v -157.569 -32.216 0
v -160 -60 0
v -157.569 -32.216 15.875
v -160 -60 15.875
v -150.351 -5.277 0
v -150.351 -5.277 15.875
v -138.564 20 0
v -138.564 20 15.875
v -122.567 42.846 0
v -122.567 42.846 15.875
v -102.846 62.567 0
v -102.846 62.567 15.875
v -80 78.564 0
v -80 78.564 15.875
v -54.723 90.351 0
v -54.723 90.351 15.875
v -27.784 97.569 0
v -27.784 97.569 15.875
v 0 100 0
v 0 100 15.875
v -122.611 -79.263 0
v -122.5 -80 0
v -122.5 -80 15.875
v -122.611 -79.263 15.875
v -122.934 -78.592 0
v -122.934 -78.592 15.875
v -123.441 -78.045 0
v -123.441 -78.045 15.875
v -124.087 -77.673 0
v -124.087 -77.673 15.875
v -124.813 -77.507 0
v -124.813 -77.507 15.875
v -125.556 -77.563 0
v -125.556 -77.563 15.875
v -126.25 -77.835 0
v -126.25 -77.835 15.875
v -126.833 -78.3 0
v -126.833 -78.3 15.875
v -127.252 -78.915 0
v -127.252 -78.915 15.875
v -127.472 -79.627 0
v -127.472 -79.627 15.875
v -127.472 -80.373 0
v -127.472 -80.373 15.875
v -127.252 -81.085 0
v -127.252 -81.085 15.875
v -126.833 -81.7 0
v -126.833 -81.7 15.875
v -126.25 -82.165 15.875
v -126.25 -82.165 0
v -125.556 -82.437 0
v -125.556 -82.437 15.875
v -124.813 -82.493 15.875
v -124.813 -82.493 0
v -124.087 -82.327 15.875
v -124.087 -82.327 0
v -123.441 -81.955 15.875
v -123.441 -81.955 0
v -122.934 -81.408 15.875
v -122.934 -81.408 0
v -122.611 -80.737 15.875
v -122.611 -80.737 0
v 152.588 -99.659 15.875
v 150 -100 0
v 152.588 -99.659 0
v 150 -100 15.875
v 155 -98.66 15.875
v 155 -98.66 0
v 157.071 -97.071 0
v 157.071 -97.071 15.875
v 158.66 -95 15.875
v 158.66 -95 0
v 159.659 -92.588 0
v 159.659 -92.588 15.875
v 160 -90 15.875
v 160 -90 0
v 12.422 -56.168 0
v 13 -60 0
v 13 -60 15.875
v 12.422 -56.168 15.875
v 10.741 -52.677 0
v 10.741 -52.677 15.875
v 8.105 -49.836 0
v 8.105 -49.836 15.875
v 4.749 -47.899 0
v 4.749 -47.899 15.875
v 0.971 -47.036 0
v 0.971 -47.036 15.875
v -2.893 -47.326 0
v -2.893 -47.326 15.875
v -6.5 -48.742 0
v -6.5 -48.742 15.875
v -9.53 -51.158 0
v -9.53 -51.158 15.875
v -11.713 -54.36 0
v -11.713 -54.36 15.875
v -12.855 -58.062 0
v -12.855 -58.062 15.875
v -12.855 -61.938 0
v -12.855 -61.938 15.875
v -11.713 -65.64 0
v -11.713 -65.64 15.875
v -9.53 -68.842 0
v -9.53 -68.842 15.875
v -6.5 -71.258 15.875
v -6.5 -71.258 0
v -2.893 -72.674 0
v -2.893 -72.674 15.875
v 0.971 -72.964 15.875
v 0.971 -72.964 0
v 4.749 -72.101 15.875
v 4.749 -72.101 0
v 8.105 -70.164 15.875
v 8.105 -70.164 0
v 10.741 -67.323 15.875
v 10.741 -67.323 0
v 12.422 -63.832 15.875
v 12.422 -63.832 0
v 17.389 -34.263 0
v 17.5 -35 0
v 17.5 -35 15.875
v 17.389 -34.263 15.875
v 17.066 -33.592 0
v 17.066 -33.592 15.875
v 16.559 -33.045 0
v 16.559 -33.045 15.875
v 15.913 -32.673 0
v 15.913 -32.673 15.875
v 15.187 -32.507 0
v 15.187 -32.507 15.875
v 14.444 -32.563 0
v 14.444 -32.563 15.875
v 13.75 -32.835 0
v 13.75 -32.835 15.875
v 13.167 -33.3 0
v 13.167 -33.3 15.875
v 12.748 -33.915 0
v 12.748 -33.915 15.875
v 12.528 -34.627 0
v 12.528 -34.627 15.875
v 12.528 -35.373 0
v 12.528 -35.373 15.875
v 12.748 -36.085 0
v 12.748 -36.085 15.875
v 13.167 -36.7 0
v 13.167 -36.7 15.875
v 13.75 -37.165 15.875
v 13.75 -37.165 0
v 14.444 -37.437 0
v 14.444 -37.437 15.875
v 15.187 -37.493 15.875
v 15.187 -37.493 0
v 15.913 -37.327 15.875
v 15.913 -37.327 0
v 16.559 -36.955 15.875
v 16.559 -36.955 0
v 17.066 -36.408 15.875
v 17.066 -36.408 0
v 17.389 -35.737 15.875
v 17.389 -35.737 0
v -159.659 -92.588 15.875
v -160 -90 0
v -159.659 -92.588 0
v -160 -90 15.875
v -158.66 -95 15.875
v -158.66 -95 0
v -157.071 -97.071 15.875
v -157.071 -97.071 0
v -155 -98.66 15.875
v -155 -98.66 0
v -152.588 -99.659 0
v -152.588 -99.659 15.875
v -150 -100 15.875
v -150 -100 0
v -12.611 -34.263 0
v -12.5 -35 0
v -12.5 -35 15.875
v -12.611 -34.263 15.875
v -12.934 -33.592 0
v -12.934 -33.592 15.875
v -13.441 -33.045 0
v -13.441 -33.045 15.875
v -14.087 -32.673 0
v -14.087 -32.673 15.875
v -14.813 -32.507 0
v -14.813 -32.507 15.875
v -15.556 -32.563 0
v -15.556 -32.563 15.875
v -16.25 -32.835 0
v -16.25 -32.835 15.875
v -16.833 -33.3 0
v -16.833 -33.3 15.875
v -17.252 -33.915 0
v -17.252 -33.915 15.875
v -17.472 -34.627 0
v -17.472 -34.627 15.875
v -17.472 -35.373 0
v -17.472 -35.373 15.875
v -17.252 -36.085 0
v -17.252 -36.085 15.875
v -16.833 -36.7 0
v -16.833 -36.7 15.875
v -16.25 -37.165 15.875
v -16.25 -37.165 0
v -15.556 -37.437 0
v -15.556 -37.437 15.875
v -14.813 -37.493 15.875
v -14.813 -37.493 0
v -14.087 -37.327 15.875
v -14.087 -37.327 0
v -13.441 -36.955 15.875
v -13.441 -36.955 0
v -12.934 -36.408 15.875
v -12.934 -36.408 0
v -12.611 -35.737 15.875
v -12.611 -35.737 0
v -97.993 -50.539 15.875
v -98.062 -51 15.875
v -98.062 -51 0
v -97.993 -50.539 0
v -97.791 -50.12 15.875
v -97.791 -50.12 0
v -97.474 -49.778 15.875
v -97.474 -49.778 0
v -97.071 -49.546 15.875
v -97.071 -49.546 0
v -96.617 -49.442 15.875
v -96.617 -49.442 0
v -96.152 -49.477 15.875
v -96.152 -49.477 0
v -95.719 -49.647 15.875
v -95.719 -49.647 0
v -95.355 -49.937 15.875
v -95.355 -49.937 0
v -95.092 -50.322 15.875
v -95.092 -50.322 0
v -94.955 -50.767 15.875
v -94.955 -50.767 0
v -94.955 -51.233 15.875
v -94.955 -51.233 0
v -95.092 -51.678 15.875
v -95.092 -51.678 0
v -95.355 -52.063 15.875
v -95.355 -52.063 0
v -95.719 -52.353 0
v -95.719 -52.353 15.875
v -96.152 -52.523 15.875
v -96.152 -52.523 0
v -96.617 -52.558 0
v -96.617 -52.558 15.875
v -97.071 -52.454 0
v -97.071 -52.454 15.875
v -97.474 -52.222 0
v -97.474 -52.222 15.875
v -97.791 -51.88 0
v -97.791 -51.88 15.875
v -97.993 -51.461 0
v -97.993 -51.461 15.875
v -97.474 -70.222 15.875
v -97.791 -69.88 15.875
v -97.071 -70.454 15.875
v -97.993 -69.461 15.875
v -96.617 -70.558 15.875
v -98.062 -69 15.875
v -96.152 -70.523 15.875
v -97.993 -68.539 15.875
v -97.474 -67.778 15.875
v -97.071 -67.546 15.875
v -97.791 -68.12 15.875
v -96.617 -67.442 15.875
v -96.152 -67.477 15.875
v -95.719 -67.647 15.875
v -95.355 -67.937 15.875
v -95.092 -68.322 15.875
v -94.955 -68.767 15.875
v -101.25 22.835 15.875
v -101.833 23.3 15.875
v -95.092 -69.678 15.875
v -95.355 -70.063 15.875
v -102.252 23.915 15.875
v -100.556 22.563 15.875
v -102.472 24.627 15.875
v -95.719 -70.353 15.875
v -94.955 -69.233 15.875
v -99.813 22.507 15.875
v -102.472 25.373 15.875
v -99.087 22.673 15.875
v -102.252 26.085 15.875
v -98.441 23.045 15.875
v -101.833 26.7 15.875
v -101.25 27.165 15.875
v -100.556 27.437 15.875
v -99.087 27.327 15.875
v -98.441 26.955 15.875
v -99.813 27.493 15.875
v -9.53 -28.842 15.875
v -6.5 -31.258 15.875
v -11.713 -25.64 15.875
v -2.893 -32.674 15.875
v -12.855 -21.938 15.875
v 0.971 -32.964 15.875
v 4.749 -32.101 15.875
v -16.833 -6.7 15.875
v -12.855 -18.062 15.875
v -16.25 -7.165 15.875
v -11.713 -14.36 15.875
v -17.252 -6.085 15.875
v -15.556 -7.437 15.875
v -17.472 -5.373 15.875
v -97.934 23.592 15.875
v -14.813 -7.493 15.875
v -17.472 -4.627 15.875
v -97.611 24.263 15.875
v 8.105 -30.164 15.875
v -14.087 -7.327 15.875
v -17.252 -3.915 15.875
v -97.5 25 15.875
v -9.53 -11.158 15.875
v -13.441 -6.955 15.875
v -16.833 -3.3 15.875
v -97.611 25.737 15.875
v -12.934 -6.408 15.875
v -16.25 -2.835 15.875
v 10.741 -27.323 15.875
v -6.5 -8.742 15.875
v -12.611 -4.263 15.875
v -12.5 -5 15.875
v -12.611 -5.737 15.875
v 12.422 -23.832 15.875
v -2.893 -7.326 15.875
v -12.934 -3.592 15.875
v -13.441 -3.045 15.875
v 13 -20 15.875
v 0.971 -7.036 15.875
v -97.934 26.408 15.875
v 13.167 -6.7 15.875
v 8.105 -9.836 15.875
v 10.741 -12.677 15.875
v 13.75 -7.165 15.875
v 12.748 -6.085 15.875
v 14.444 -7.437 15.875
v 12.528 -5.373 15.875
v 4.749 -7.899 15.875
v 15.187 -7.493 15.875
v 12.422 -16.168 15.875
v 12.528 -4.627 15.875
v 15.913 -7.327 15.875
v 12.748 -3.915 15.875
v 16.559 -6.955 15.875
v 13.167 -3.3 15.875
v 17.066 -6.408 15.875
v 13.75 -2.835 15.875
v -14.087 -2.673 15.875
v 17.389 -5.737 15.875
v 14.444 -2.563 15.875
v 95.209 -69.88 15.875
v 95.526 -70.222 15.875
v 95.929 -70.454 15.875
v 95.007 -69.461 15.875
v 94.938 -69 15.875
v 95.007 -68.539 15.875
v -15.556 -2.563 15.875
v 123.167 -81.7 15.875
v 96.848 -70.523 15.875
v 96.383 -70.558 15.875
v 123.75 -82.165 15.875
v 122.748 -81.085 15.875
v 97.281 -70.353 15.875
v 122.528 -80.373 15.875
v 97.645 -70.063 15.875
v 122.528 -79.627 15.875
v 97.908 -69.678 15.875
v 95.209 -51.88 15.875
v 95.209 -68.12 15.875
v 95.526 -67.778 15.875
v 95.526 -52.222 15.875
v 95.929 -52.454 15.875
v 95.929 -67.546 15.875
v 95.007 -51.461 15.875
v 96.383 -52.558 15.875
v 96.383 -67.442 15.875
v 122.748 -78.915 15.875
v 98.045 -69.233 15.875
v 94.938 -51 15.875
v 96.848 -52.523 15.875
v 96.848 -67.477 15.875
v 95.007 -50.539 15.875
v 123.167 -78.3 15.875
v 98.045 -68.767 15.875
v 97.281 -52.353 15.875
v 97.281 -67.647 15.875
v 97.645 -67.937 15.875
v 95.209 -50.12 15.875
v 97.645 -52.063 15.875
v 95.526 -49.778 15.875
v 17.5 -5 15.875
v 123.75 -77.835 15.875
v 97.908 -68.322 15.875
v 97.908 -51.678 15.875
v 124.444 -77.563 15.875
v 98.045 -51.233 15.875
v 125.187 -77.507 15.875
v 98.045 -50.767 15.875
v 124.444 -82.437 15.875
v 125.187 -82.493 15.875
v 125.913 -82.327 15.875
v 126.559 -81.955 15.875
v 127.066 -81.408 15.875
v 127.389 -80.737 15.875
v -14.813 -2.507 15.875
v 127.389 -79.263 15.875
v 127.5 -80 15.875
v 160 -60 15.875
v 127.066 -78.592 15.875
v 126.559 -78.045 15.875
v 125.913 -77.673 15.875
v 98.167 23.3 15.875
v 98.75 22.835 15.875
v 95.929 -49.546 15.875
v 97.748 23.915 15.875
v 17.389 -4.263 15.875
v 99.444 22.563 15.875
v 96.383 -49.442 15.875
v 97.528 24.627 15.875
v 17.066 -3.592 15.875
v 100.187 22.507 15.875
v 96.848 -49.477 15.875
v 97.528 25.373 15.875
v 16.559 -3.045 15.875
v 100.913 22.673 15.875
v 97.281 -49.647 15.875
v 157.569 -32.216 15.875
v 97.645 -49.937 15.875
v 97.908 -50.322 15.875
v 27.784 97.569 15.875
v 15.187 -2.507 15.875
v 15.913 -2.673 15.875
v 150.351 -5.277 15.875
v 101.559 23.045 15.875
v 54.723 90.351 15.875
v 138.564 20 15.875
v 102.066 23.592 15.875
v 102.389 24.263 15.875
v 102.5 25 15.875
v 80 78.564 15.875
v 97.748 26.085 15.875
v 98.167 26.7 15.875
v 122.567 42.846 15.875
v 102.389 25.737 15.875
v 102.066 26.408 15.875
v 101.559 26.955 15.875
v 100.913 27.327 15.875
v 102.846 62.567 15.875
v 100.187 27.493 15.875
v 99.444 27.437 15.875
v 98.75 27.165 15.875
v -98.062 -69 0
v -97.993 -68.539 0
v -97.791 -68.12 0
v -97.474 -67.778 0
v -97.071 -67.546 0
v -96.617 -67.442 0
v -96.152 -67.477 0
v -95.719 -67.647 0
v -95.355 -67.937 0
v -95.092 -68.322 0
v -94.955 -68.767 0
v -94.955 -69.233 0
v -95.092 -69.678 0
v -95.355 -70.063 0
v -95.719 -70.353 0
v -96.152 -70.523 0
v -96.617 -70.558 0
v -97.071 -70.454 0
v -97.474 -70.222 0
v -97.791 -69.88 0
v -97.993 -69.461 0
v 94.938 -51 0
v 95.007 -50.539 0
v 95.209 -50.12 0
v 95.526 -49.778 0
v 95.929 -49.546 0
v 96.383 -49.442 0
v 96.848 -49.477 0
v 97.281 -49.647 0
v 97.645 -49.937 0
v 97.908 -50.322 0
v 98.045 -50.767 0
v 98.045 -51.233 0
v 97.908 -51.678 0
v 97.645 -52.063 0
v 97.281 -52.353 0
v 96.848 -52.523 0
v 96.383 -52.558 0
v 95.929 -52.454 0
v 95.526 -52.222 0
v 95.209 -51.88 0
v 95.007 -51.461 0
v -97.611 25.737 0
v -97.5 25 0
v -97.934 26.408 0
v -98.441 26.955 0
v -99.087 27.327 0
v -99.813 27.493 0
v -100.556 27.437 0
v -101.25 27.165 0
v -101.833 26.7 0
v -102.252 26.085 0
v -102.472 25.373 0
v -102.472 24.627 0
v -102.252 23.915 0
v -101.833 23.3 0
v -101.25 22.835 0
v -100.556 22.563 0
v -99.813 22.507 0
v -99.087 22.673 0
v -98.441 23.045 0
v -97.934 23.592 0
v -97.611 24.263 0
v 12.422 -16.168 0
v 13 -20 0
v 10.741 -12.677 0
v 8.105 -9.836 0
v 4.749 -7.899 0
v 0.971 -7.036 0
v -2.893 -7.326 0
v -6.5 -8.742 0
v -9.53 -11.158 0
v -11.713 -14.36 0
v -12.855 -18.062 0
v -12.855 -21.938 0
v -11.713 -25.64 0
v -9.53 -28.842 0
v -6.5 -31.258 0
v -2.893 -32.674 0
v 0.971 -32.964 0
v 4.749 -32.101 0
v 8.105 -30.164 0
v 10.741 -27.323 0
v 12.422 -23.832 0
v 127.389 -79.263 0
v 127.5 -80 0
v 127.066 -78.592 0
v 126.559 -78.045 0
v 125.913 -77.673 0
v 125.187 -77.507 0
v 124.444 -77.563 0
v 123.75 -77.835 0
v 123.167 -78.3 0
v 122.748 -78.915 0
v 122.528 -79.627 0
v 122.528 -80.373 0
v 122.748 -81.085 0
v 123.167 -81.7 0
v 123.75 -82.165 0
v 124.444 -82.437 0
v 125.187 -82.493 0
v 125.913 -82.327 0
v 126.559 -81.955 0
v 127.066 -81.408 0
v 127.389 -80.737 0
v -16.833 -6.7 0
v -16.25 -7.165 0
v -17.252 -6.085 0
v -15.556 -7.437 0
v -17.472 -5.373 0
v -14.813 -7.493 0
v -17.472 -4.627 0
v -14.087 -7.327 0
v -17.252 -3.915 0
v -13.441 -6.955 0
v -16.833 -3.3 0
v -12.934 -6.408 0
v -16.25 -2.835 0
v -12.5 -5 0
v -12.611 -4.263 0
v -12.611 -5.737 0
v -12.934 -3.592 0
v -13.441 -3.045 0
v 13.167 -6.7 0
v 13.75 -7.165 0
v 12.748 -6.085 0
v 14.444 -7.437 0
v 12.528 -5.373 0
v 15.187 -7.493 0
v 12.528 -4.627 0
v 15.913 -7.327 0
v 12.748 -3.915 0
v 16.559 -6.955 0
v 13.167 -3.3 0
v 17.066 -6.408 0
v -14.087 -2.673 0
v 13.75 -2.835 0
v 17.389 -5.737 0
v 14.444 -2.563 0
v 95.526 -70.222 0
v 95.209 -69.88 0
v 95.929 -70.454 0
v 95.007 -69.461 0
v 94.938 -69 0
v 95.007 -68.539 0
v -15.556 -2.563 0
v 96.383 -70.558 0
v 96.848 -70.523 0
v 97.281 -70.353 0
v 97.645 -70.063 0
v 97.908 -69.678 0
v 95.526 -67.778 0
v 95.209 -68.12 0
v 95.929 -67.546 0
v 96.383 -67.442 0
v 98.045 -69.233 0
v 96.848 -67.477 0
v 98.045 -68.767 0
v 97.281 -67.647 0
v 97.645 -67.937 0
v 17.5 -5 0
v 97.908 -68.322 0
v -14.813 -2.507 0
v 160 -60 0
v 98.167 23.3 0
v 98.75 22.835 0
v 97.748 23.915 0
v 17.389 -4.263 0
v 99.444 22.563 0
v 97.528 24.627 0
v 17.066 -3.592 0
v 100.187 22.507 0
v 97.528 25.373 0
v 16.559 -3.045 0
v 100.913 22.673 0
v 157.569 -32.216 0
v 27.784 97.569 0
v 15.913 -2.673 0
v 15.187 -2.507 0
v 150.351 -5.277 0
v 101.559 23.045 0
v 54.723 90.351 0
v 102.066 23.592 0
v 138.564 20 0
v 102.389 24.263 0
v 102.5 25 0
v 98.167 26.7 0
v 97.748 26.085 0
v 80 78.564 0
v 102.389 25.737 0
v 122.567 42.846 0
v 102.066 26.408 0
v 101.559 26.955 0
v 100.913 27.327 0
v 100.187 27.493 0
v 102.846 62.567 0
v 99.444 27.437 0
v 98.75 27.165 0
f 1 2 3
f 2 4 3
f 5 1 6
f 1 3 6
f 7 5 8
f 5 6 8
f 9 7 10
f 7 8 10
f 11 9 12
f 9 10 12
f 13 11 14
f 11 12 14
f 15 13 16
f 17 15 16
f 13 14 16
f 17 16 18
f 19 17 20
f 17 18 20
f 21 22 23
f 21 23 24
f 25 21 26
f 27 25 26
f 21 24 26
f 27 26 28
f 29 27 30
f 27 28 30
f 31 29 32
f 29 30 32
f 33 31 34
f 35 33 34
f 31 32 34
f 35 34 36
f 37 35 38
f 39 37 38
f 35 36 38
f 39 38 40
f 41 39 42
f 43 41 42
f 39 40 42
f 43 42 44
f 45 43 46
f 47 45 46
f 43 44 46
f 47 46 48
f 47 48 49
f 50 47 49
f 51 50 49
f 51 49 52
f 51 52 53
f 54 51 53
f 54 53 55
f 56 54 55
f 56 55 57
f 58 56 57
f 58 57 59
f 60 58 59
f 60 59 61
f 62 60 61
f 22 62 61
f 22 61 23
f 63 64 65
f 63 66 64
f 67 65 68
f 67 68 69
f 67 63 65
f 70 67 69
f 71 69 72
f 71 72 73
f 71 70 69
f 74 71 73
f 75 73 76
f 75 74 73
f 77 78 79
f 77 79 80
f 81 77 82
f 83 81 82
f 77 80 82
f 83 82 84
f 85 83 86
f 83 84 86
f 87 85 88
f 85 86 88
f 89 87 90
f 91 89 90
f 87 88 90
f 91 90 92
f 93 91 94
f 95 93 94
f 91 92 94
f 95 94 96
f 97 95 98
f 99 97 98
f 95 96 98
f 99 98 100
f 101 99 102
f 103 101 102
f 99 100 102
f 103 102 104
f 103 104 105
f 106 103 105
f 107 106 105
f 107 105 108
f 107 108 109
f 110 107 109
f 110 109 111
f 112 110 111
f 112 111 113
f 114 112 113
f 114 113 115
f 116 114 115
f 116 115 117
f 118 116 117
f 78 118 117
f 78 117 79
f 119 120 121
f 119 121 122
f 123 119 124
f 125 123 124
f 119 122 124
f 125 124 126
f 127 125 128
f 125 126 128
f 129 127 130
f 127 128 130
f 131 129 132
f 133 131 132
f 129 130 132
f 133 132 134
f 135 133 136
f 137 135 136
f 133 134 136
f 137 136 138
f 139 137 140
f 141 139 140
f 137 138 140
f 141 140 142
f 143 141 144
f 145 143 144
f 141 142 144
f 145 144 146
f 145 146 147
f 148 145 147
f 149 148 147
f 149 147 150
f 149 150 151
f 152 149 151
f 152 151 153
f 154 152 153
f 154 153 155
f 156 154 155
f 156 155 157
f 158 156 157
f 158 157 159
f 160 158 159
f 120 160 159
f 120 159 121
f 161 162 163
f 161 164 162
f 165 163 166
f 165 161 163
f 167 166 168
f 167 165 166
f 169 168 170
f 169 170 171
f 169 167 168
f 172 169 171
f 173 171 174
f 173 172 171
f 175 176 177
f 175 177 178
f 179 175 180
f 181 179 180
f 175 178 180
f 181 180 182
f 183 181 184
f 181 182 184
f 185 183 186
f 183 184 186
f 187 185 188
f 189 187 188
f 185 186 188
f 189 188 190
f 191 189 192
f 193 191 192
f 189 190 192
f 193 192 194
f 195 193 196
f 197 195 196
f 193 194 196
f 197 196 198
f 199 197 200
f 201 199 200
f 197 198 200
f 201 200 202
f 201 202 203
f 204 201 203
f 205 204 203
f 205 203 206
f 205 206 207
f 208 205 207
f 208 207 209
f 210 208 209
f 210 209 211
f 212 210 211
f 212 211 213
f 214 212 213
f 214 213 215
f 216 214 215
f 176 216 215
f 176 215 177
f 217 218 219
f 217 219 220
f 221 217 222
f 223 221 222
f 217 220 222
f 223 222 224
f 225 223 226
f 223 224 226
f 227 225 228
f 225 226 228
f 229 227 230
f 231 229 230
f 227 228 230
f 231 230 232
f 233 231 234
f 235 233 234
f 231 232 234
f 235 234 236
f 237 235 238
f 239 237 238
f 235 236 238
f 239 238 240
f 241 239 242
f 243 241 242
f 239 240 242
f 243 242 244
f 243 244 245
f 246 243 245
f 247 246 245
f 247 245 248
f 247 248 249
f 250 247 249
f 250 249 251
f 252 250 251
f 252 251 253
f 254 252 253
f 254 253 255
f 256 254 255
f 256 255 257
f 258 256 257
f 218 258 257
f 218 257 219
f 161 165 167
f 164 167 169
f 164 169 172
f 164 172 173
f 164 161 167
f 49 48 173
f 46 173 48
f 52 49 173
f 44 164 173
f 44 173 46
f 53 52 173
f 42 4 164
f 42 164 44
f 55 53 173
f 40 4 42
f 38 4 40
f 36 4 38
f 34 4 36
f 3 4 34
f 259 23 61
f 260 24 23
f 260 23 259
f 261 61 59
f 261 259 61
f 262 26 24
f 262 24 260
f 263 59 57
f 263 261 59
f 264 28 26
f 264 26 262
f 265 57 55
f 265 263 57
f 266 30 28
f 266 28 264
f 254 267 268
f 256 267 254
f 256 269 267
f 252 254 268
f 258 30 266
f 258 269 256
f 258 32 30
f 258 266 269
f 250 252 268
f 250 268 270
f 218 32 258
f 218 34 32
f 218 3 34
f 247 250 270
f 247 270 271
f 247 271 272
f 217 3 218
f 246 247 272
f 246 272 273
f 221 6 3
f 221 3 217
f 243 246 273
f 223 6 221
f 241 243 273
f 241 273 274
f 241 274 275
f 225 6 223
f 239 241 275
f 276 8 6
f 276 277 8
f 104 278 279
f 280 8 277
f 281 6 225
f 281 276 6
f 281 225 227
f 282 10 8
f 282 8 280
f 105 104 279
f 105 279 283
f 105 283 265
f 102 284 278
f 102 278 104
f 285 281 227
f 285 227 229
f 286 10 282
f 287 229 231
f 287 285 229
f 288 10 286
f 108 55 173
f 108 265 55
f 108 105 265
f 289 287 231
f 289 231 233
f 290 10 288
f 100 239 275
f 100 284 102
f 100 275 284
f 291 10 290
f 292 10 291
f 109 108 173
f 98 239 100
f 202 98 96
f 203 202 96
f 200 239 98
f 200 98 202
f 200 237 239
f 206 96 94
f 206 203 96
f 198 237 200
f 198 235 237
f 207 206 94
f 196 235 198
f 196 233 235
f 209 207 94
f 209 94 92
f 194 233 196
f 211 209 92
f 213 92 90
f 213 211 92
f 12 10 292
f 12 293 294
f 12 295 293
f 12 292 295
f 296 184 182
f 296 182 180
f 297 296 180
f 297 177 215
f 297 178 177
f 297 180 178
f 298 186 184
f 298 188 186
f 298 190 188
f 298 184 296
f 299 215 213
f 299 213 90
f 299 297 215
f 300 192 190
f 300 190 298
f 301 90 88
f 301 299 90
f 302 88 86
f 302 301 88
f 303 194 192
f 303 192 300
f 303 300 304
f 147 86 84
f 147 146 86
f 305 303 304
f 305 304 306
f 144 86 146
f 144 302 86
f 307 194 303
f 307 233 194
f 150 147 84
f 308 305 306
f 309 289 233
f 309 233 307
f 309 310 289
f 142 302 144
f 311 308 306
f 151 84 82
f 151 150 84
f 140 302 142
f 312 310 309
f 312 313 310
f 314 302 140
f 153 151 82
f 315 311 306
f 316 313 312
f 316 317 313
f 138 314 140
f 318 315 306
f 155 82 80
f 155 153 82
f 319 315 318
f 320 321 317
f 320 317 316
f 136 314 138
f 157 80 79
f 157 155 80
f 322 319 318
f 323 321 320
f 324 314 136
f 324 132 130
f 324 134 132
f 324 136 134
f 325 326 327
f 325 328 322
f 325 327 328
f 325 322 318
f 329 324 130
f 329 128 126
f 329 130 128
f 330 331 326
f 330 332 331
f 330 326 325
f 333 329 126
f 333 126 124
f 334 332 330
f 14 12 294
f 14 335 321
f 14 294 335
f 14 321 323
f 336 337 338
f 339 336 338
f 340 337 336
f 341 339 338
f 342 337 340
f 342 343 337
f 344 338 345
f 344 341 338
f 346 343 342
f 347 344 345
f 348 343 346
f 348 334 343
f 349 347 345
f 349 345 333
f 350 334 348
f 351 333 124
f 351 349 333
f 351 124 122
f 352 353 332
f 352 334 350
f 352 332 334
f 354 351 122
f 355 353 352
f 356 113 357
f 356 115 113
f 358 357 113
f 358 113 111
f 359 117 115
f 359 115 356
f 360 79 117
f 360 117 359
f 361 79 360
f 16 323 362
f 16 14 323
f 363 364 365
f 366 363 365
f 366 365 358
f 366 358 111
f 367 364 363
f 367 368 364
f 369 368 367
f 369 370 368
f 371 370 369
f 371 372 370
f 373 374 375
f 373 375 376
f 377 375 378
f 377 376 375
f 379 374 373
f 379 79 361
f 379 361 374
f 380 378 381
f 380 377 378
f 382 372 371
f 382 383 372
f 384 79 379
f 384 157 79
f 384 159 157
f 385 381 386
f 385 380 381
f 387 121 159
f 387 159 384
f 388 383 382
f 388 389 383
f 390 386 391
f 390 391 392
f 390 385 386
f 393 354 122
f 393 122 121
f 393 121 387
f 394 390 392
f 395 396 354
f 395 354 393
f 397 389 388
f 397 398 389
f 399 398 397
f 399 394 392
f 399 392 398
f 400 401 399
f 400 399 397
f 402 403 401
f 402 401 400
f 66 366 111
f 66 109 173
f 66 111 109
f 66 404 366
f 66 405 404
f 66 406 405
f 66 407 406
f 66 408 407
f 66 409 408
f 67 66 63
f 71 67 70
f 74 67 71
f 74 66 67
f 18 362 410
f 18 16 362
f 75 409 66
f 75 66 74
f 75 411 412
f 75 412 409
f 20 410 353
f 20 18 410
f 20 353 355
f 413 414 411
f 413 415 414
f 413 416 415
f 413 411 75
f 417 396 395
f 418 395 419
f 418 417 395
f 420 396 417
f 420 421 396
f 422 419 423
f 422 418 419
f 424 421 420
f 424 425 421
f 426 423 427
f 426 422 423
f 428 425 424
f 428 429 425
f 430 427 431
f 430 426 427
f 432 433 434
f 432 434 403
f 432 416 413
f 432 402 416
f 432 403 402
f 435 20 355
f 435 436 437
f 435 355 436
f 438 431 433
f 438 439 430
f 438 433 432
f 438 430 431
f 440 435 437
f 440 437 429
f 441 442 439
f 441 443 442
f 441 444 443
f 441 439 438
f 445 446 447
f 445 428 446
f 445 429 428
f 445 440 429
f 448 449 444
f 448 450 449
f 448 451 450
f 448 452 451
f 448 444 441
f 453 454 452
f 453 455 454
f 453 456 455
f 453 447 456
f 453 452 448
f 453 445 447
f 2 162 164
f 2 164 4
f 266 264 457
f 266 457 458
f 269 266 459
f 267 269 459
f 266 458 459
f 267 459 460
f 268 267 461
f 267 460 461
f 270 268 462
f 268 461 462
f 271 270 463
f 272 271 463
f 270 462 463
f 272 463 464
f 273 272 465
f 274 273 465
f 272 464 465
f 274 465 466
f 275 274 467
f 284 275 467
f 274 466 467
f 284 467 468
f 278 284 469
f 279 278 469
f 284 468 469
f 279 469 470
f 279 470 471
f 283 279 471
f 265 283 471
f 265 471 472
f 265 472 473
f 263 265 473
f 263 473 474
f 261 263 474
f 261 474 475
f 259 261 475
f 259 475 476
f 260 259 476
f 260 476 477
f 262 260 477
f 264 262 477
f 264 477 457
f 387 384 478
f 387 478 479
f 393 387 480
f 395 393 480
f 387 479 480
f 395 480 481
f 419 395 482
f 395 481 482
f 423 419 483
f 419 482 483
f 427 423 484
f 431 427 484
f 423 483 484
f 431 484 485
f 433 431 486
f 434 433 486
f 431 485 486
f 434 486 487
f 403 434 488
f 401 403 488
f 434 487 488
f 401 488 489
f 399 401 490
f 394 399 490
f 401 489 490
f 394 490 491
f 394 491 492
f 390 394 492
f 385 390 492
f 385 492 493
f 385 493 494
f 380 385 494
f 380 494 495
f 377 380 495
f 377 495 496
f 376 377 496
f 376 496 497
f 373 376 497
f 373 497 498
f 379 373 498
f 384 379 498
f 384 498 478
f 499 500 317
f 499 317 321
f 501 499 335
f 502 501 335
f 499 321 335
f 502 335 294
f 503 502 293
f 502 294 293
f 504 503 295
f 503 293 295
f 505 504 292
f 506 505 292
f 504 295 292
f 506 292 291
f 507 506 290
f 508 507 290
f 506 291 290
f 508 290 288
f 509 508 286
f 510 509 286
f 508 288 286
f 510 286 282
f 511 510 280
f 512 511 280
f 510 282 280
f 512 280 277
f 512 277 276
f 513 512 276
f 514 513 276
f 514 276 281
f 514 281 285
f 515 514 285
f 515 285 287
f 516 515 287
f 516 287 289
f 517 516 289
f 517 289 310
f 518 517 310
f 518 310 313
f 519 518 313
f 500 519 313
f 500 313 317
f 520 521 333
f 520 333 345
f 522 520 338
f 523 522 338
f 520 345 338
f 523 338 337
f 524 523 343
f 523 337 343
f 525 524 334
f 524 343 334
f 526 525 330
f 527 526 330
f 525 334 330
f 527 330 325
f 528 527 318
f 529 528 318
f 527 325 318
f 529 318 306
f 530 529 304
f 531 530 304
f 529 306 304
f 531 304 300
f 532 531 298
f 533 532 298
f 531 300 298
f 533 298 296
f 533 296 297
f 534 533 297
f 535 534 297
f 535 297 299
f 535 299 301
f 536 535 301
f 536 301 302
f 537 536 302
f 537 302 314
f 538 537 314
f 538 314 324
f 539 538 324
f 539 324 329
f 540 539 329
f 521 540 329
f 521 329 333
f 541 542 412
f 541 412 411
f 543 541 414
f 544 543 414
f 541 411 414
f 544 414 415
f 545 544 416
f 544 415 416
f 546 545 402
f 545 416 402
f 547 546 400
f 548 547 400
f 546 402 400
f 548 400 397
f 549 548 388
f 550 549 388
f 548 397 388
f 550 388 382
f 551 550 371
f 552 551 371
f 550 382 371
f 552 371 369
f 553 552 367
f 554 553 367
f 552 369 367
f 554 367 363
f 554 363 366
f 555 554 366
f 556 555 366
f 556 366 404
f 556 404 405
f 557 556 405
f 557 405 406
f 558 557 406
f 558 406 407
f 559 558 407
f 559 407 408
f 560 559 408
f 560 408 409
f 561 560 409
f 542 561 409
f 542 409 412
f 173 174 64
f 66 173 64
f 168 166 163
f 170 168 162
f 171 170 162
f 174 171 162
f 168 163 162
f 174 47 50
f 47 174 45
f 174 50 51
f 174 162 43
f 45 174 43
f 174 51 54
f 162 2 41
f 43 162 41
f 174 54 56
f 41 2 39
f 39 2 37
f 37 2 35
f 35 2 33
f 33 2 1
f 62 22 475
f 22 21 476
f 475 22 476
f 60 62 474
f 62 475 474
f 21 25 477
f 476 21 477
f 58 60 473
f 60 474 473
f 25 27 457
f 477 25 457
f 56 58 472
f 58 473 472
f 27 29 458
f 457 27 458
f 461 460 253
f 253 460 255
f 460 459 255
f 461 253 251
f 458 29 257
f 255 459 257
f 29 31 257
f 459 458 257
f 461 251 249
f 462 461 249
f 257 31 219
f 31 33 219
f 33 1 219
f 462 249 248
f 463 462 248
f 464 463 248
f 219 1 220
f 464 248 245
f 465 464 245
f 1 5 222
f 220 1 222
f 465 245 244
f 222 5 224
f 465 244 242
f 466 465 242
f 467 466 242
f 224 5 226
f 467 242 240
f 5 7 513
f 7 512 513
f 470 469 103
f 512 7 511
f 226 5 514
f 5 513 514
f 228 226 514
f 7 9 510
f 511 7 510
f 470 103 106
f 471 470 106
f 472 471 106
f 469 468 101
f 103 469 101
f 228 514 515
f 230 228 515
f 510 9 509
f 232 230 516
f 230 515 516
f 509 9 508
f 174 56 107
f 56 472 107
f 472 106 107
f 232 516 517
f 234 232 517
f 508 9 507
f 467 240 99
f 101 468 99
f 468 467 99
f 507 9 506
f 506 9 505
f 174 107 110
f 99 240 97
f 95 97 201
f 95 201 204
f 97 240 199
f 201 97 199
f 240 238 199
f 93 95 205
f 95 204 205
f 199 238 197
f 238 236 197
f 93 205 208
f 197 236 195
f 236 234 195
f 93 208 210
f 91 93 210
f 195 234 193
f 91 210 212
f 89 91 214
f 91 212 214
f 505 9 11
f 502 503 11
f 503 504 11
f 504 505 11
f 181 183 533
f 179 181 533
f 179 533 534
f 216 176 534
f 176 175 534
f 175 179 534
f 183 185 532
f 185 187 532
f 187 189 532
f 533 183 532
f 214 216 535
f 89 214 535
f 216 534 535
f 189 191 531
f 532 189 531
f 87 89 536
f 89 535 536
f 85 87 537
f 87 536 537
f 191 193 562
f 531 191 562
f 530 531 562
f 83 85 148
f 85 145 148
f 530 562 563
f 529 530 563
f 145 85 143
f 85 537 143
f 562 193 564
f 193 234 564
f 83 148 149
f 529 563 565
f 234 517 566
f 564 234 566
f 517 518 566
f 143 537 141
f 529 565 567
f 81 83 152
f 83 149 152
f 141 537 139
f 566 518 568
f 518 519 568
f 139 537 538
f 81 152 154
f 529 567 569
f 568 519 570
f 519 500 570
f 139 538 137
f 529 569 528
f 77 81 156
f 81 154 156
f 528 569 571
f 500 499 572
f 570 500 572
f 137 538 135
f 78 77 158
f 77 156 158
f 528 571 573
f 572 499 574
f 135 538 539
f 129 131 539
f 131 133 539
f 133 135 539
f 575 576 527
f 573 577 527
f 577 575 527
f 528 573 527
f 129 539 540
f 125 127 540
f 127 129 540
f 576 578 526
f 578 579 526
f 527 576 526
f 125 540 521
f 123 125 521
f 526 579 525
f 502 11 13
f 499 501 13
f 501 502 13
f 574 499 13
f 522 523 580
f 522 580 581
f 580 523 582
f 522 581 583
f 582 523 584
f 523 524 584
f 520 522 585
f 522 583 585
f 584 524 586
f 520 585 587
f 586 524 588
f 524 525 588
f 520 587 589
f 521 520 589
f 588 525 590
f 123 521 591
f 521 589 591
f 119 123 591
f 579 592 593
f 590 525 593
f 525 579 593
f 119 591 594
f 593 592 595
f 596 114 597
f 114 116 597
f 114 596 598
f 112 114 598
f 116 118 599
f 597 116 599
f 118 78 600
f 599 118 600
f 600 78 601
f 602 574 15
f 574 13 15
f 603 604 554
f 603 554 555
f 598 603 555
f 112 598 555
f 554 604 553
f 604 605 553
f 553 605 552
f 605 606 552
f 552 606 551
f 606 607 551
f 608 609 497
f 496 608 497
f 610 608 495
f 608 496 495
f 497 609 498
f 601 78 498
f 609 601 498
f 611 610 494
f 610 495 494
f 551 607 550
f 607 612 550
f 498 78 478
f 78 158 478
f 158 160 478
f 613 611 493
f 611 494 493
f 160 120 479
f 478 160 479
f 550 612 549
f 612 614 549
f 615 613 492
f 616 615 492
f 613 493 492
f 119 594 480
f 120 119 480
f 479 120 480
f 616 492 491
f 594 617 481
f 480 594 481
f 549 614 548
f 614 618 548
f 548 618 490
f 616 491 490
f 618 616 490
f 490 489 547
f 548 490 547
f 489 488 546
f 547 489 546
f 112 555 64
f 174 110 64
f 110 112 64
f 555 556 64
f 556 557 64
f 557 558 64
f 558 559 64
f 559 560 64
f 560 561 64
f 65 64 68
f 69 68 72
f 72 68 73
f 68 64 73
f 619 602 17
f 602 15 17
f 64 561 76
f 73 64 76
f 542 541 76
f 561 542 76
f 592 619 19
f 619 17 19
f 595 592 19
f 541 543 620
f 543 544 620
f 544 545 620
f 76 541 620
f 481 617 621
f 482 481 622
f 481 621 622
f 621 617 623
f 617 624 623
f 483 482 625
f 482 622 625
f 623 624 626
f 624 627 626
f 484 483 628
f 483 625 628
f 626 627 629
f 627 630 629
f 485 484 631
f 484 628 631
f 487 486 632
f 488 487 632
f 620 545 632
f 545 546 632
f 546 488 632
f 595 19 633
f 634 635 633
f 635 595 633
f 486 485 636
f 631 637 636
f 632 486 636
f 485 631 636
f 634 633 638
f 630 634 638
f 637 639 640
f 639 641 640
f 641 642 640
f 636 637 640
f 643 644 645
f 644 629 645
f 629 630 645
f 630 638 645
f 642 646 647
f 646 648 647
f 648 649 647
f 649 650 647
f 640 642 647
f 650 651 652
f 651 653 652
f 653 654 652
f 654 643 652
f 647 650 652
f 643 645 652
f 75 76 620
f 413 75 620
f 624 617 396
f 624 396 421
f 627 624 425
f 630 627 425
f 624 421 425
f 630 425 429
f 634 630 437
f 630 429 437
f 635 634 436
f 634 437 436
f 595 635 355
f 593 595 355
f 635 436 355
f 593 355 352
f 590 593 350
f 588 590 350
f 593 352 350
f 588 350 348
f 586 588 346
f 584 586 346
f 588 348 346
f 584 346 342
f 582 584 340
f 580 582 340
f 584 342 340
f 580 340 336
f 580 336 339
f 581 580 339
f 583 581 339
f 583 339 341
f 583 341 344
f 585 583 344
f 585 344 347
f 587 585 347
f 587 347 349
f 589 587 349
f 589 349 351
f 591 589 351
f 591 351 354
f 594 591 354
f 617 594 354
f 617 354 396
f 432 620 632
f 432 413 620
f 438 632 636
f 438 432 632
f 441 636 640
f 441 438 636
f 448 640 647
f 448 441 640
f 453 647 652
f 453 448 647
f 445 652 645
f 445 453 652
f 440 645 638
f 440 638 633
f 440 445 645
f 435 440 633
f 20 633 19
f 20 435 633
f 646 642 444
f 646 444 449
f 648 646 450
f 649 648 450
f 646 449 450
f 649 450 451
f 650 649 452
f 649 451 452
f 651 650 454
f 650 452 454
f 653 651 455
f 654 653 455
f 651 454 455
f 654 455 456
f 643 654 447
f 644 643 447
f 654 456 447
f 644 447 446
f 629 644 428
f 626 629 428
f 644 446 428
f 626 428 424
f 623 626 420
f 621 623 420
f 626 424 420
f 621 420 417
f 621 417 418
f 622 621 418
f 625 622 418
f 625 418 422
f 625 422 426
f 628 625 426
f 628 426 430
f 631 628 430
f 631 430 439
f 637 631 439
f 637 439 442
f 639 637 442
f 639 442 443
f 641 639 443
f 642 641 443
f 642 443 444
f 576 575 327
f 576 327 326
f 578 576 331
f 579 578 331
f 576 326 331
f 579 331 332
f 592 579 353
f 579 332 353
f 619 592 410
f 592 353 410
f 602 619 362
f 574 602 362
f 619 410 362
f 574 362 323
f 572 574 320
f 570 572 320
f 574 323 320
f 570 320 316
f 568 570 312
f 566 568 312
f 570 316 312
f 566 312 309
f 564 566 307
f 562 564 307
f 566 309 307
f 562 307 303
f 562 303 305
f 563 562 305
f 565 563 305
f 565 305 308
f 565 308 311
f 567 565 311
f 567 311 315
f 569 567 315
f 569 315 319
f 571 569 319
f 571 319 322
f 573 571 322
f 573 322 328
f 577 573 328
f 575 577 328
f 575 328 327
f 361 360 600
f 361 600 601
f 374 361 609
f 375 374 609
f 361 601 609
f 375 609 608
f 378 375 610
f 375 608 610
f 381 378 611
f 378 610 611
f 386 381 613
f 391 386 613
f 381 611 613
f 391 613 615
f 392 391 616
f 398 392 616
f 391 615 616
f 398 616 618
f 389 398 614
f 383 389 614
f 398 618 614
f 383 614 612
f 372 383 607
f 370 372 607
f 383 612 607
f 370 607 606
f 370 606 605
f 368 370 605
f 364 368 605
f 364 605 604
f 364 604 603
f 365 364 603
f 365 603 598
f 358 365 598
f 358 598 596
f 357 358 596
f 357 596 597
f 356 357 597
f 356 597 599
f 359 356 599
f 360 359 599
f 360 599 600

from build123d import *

# Parameters (mm, degrees)
SKETCH1_W           = 320
SKETCH1_H           = 200
BOSS_EXTRUDE1_DEPTH = 15.875
FILLET1_R           = 160
FILLET2_R           = 10
SKETCH2_R           = 13
CUT_EXTRUDE1_DEPTH  = 190.346284952
SKETCH3_R           = 2.5
CUT_EXTRUDE2_DEPTH  = 190.346284952
SKETCH4_R           = 2.5
CUT_EXTRUDE3_DEPTH  = 190.346284952
SKETCH5_R           = 1.5625
CUT_EXTRUDE4_DEPTH  = 190.346284952


with BuildPart() as part:
    # Sketch1 → Boss-Extrude1 (new body)
    with BuildSketch(Plane.XY):
        Rectangle(SKETCH1_W, SKETCH1_H)
    extrude(amount=BOSS_EXTRUDE1_DEPTH)

    # Fillet1
    fillet1_edges = [part.edges().sort_by_distance(p)[0] for p in [
        (-160, 100, 7.9375),
        (160, 100, 7.9375),
    ]]
    fillet(fillet1_edges, radius=FILLET1_R - 0.0001)  # a hair under: the kernel refuses the full size

    # Fillet2
    fillet2_edges = [part.edges().sort_by_distance(p)[0] for p in [
        (160, -100, 7.9375),
        (-160, -100, 7.9375),
    ]]
    fillet(fillet2_edges, radius=FILLET2_R)

    # Sketch2 → Cut-Extrude1 (cut, through all)
    with BuildSketch(Plane.XY.offset(15.875)):
        with Locations((0, -60)):
            Circle(SKETCH2_R)
        with Locations((0, -20)):
            Circle(SKETCH2_R)
    extrude(amount=-CUT_EXTRUDE1_DEPTH, mode=Mode.SUBTRACT)

    # Sketch3 → Cut-Extrude2 (cut, through all)
    with BuildSketch(Plane.XY.offset(15.875)):
        with Locations((-15, -5)):
            Circle(SKETCH3_R)
        with Locations((-15, -35)):
            Circle(SKETCH3_R)
        with Locations((15, -35)):
            Circle(SKETCH3_R)
        with Locations((15, -5)):
            Circle(SKETCH3_R)
    extrude(amount=-CUT_EXTRUDE2_DEPTH, mode=Mode.SUBTRACT)

    # Sketch4 → Cut-Extrude3 (cut, through all)
    with BuildSketch(Plane.XY.offset(15.875)):
        with Locations((-100, 25)):
            Circle(SKETCH4_R)
        with Locations((100, 25)):
            Circle(SKETCH4_R)
        with Locations((125, -80)):
            Circle(SKETCH4_R)
        with Locations((-125, -80)):
            Circle(SKETCH4_R)
    extrude(amount=-CUT_EXTRUDE3_DEPTH, mode=Mode.SUBTRACT)

    # Sketch5 → Cut-Extrude4 (cut, through all)
    with BuildSketch(Plane(origin=(0, 0, 0), x_dir=(-1, 0, 0), z_dir=(0, 0, -1))):
        with Locations((96.5, -51)):
            Circle(SKETCH5_R)
        with Locations((96.5, -69)):
            Circle(SKETCH5_R)
        with Locations((-96.5, -51)):
            Circle(SKETCH5_R)
        with Locations((-96.5, -69)):
            Circle(SKETCH5_R)
    extrude(amount=-CUT_EXTRUDE4_DEPTH, mode=Mode.SUBTRACT)


solid = part.part
